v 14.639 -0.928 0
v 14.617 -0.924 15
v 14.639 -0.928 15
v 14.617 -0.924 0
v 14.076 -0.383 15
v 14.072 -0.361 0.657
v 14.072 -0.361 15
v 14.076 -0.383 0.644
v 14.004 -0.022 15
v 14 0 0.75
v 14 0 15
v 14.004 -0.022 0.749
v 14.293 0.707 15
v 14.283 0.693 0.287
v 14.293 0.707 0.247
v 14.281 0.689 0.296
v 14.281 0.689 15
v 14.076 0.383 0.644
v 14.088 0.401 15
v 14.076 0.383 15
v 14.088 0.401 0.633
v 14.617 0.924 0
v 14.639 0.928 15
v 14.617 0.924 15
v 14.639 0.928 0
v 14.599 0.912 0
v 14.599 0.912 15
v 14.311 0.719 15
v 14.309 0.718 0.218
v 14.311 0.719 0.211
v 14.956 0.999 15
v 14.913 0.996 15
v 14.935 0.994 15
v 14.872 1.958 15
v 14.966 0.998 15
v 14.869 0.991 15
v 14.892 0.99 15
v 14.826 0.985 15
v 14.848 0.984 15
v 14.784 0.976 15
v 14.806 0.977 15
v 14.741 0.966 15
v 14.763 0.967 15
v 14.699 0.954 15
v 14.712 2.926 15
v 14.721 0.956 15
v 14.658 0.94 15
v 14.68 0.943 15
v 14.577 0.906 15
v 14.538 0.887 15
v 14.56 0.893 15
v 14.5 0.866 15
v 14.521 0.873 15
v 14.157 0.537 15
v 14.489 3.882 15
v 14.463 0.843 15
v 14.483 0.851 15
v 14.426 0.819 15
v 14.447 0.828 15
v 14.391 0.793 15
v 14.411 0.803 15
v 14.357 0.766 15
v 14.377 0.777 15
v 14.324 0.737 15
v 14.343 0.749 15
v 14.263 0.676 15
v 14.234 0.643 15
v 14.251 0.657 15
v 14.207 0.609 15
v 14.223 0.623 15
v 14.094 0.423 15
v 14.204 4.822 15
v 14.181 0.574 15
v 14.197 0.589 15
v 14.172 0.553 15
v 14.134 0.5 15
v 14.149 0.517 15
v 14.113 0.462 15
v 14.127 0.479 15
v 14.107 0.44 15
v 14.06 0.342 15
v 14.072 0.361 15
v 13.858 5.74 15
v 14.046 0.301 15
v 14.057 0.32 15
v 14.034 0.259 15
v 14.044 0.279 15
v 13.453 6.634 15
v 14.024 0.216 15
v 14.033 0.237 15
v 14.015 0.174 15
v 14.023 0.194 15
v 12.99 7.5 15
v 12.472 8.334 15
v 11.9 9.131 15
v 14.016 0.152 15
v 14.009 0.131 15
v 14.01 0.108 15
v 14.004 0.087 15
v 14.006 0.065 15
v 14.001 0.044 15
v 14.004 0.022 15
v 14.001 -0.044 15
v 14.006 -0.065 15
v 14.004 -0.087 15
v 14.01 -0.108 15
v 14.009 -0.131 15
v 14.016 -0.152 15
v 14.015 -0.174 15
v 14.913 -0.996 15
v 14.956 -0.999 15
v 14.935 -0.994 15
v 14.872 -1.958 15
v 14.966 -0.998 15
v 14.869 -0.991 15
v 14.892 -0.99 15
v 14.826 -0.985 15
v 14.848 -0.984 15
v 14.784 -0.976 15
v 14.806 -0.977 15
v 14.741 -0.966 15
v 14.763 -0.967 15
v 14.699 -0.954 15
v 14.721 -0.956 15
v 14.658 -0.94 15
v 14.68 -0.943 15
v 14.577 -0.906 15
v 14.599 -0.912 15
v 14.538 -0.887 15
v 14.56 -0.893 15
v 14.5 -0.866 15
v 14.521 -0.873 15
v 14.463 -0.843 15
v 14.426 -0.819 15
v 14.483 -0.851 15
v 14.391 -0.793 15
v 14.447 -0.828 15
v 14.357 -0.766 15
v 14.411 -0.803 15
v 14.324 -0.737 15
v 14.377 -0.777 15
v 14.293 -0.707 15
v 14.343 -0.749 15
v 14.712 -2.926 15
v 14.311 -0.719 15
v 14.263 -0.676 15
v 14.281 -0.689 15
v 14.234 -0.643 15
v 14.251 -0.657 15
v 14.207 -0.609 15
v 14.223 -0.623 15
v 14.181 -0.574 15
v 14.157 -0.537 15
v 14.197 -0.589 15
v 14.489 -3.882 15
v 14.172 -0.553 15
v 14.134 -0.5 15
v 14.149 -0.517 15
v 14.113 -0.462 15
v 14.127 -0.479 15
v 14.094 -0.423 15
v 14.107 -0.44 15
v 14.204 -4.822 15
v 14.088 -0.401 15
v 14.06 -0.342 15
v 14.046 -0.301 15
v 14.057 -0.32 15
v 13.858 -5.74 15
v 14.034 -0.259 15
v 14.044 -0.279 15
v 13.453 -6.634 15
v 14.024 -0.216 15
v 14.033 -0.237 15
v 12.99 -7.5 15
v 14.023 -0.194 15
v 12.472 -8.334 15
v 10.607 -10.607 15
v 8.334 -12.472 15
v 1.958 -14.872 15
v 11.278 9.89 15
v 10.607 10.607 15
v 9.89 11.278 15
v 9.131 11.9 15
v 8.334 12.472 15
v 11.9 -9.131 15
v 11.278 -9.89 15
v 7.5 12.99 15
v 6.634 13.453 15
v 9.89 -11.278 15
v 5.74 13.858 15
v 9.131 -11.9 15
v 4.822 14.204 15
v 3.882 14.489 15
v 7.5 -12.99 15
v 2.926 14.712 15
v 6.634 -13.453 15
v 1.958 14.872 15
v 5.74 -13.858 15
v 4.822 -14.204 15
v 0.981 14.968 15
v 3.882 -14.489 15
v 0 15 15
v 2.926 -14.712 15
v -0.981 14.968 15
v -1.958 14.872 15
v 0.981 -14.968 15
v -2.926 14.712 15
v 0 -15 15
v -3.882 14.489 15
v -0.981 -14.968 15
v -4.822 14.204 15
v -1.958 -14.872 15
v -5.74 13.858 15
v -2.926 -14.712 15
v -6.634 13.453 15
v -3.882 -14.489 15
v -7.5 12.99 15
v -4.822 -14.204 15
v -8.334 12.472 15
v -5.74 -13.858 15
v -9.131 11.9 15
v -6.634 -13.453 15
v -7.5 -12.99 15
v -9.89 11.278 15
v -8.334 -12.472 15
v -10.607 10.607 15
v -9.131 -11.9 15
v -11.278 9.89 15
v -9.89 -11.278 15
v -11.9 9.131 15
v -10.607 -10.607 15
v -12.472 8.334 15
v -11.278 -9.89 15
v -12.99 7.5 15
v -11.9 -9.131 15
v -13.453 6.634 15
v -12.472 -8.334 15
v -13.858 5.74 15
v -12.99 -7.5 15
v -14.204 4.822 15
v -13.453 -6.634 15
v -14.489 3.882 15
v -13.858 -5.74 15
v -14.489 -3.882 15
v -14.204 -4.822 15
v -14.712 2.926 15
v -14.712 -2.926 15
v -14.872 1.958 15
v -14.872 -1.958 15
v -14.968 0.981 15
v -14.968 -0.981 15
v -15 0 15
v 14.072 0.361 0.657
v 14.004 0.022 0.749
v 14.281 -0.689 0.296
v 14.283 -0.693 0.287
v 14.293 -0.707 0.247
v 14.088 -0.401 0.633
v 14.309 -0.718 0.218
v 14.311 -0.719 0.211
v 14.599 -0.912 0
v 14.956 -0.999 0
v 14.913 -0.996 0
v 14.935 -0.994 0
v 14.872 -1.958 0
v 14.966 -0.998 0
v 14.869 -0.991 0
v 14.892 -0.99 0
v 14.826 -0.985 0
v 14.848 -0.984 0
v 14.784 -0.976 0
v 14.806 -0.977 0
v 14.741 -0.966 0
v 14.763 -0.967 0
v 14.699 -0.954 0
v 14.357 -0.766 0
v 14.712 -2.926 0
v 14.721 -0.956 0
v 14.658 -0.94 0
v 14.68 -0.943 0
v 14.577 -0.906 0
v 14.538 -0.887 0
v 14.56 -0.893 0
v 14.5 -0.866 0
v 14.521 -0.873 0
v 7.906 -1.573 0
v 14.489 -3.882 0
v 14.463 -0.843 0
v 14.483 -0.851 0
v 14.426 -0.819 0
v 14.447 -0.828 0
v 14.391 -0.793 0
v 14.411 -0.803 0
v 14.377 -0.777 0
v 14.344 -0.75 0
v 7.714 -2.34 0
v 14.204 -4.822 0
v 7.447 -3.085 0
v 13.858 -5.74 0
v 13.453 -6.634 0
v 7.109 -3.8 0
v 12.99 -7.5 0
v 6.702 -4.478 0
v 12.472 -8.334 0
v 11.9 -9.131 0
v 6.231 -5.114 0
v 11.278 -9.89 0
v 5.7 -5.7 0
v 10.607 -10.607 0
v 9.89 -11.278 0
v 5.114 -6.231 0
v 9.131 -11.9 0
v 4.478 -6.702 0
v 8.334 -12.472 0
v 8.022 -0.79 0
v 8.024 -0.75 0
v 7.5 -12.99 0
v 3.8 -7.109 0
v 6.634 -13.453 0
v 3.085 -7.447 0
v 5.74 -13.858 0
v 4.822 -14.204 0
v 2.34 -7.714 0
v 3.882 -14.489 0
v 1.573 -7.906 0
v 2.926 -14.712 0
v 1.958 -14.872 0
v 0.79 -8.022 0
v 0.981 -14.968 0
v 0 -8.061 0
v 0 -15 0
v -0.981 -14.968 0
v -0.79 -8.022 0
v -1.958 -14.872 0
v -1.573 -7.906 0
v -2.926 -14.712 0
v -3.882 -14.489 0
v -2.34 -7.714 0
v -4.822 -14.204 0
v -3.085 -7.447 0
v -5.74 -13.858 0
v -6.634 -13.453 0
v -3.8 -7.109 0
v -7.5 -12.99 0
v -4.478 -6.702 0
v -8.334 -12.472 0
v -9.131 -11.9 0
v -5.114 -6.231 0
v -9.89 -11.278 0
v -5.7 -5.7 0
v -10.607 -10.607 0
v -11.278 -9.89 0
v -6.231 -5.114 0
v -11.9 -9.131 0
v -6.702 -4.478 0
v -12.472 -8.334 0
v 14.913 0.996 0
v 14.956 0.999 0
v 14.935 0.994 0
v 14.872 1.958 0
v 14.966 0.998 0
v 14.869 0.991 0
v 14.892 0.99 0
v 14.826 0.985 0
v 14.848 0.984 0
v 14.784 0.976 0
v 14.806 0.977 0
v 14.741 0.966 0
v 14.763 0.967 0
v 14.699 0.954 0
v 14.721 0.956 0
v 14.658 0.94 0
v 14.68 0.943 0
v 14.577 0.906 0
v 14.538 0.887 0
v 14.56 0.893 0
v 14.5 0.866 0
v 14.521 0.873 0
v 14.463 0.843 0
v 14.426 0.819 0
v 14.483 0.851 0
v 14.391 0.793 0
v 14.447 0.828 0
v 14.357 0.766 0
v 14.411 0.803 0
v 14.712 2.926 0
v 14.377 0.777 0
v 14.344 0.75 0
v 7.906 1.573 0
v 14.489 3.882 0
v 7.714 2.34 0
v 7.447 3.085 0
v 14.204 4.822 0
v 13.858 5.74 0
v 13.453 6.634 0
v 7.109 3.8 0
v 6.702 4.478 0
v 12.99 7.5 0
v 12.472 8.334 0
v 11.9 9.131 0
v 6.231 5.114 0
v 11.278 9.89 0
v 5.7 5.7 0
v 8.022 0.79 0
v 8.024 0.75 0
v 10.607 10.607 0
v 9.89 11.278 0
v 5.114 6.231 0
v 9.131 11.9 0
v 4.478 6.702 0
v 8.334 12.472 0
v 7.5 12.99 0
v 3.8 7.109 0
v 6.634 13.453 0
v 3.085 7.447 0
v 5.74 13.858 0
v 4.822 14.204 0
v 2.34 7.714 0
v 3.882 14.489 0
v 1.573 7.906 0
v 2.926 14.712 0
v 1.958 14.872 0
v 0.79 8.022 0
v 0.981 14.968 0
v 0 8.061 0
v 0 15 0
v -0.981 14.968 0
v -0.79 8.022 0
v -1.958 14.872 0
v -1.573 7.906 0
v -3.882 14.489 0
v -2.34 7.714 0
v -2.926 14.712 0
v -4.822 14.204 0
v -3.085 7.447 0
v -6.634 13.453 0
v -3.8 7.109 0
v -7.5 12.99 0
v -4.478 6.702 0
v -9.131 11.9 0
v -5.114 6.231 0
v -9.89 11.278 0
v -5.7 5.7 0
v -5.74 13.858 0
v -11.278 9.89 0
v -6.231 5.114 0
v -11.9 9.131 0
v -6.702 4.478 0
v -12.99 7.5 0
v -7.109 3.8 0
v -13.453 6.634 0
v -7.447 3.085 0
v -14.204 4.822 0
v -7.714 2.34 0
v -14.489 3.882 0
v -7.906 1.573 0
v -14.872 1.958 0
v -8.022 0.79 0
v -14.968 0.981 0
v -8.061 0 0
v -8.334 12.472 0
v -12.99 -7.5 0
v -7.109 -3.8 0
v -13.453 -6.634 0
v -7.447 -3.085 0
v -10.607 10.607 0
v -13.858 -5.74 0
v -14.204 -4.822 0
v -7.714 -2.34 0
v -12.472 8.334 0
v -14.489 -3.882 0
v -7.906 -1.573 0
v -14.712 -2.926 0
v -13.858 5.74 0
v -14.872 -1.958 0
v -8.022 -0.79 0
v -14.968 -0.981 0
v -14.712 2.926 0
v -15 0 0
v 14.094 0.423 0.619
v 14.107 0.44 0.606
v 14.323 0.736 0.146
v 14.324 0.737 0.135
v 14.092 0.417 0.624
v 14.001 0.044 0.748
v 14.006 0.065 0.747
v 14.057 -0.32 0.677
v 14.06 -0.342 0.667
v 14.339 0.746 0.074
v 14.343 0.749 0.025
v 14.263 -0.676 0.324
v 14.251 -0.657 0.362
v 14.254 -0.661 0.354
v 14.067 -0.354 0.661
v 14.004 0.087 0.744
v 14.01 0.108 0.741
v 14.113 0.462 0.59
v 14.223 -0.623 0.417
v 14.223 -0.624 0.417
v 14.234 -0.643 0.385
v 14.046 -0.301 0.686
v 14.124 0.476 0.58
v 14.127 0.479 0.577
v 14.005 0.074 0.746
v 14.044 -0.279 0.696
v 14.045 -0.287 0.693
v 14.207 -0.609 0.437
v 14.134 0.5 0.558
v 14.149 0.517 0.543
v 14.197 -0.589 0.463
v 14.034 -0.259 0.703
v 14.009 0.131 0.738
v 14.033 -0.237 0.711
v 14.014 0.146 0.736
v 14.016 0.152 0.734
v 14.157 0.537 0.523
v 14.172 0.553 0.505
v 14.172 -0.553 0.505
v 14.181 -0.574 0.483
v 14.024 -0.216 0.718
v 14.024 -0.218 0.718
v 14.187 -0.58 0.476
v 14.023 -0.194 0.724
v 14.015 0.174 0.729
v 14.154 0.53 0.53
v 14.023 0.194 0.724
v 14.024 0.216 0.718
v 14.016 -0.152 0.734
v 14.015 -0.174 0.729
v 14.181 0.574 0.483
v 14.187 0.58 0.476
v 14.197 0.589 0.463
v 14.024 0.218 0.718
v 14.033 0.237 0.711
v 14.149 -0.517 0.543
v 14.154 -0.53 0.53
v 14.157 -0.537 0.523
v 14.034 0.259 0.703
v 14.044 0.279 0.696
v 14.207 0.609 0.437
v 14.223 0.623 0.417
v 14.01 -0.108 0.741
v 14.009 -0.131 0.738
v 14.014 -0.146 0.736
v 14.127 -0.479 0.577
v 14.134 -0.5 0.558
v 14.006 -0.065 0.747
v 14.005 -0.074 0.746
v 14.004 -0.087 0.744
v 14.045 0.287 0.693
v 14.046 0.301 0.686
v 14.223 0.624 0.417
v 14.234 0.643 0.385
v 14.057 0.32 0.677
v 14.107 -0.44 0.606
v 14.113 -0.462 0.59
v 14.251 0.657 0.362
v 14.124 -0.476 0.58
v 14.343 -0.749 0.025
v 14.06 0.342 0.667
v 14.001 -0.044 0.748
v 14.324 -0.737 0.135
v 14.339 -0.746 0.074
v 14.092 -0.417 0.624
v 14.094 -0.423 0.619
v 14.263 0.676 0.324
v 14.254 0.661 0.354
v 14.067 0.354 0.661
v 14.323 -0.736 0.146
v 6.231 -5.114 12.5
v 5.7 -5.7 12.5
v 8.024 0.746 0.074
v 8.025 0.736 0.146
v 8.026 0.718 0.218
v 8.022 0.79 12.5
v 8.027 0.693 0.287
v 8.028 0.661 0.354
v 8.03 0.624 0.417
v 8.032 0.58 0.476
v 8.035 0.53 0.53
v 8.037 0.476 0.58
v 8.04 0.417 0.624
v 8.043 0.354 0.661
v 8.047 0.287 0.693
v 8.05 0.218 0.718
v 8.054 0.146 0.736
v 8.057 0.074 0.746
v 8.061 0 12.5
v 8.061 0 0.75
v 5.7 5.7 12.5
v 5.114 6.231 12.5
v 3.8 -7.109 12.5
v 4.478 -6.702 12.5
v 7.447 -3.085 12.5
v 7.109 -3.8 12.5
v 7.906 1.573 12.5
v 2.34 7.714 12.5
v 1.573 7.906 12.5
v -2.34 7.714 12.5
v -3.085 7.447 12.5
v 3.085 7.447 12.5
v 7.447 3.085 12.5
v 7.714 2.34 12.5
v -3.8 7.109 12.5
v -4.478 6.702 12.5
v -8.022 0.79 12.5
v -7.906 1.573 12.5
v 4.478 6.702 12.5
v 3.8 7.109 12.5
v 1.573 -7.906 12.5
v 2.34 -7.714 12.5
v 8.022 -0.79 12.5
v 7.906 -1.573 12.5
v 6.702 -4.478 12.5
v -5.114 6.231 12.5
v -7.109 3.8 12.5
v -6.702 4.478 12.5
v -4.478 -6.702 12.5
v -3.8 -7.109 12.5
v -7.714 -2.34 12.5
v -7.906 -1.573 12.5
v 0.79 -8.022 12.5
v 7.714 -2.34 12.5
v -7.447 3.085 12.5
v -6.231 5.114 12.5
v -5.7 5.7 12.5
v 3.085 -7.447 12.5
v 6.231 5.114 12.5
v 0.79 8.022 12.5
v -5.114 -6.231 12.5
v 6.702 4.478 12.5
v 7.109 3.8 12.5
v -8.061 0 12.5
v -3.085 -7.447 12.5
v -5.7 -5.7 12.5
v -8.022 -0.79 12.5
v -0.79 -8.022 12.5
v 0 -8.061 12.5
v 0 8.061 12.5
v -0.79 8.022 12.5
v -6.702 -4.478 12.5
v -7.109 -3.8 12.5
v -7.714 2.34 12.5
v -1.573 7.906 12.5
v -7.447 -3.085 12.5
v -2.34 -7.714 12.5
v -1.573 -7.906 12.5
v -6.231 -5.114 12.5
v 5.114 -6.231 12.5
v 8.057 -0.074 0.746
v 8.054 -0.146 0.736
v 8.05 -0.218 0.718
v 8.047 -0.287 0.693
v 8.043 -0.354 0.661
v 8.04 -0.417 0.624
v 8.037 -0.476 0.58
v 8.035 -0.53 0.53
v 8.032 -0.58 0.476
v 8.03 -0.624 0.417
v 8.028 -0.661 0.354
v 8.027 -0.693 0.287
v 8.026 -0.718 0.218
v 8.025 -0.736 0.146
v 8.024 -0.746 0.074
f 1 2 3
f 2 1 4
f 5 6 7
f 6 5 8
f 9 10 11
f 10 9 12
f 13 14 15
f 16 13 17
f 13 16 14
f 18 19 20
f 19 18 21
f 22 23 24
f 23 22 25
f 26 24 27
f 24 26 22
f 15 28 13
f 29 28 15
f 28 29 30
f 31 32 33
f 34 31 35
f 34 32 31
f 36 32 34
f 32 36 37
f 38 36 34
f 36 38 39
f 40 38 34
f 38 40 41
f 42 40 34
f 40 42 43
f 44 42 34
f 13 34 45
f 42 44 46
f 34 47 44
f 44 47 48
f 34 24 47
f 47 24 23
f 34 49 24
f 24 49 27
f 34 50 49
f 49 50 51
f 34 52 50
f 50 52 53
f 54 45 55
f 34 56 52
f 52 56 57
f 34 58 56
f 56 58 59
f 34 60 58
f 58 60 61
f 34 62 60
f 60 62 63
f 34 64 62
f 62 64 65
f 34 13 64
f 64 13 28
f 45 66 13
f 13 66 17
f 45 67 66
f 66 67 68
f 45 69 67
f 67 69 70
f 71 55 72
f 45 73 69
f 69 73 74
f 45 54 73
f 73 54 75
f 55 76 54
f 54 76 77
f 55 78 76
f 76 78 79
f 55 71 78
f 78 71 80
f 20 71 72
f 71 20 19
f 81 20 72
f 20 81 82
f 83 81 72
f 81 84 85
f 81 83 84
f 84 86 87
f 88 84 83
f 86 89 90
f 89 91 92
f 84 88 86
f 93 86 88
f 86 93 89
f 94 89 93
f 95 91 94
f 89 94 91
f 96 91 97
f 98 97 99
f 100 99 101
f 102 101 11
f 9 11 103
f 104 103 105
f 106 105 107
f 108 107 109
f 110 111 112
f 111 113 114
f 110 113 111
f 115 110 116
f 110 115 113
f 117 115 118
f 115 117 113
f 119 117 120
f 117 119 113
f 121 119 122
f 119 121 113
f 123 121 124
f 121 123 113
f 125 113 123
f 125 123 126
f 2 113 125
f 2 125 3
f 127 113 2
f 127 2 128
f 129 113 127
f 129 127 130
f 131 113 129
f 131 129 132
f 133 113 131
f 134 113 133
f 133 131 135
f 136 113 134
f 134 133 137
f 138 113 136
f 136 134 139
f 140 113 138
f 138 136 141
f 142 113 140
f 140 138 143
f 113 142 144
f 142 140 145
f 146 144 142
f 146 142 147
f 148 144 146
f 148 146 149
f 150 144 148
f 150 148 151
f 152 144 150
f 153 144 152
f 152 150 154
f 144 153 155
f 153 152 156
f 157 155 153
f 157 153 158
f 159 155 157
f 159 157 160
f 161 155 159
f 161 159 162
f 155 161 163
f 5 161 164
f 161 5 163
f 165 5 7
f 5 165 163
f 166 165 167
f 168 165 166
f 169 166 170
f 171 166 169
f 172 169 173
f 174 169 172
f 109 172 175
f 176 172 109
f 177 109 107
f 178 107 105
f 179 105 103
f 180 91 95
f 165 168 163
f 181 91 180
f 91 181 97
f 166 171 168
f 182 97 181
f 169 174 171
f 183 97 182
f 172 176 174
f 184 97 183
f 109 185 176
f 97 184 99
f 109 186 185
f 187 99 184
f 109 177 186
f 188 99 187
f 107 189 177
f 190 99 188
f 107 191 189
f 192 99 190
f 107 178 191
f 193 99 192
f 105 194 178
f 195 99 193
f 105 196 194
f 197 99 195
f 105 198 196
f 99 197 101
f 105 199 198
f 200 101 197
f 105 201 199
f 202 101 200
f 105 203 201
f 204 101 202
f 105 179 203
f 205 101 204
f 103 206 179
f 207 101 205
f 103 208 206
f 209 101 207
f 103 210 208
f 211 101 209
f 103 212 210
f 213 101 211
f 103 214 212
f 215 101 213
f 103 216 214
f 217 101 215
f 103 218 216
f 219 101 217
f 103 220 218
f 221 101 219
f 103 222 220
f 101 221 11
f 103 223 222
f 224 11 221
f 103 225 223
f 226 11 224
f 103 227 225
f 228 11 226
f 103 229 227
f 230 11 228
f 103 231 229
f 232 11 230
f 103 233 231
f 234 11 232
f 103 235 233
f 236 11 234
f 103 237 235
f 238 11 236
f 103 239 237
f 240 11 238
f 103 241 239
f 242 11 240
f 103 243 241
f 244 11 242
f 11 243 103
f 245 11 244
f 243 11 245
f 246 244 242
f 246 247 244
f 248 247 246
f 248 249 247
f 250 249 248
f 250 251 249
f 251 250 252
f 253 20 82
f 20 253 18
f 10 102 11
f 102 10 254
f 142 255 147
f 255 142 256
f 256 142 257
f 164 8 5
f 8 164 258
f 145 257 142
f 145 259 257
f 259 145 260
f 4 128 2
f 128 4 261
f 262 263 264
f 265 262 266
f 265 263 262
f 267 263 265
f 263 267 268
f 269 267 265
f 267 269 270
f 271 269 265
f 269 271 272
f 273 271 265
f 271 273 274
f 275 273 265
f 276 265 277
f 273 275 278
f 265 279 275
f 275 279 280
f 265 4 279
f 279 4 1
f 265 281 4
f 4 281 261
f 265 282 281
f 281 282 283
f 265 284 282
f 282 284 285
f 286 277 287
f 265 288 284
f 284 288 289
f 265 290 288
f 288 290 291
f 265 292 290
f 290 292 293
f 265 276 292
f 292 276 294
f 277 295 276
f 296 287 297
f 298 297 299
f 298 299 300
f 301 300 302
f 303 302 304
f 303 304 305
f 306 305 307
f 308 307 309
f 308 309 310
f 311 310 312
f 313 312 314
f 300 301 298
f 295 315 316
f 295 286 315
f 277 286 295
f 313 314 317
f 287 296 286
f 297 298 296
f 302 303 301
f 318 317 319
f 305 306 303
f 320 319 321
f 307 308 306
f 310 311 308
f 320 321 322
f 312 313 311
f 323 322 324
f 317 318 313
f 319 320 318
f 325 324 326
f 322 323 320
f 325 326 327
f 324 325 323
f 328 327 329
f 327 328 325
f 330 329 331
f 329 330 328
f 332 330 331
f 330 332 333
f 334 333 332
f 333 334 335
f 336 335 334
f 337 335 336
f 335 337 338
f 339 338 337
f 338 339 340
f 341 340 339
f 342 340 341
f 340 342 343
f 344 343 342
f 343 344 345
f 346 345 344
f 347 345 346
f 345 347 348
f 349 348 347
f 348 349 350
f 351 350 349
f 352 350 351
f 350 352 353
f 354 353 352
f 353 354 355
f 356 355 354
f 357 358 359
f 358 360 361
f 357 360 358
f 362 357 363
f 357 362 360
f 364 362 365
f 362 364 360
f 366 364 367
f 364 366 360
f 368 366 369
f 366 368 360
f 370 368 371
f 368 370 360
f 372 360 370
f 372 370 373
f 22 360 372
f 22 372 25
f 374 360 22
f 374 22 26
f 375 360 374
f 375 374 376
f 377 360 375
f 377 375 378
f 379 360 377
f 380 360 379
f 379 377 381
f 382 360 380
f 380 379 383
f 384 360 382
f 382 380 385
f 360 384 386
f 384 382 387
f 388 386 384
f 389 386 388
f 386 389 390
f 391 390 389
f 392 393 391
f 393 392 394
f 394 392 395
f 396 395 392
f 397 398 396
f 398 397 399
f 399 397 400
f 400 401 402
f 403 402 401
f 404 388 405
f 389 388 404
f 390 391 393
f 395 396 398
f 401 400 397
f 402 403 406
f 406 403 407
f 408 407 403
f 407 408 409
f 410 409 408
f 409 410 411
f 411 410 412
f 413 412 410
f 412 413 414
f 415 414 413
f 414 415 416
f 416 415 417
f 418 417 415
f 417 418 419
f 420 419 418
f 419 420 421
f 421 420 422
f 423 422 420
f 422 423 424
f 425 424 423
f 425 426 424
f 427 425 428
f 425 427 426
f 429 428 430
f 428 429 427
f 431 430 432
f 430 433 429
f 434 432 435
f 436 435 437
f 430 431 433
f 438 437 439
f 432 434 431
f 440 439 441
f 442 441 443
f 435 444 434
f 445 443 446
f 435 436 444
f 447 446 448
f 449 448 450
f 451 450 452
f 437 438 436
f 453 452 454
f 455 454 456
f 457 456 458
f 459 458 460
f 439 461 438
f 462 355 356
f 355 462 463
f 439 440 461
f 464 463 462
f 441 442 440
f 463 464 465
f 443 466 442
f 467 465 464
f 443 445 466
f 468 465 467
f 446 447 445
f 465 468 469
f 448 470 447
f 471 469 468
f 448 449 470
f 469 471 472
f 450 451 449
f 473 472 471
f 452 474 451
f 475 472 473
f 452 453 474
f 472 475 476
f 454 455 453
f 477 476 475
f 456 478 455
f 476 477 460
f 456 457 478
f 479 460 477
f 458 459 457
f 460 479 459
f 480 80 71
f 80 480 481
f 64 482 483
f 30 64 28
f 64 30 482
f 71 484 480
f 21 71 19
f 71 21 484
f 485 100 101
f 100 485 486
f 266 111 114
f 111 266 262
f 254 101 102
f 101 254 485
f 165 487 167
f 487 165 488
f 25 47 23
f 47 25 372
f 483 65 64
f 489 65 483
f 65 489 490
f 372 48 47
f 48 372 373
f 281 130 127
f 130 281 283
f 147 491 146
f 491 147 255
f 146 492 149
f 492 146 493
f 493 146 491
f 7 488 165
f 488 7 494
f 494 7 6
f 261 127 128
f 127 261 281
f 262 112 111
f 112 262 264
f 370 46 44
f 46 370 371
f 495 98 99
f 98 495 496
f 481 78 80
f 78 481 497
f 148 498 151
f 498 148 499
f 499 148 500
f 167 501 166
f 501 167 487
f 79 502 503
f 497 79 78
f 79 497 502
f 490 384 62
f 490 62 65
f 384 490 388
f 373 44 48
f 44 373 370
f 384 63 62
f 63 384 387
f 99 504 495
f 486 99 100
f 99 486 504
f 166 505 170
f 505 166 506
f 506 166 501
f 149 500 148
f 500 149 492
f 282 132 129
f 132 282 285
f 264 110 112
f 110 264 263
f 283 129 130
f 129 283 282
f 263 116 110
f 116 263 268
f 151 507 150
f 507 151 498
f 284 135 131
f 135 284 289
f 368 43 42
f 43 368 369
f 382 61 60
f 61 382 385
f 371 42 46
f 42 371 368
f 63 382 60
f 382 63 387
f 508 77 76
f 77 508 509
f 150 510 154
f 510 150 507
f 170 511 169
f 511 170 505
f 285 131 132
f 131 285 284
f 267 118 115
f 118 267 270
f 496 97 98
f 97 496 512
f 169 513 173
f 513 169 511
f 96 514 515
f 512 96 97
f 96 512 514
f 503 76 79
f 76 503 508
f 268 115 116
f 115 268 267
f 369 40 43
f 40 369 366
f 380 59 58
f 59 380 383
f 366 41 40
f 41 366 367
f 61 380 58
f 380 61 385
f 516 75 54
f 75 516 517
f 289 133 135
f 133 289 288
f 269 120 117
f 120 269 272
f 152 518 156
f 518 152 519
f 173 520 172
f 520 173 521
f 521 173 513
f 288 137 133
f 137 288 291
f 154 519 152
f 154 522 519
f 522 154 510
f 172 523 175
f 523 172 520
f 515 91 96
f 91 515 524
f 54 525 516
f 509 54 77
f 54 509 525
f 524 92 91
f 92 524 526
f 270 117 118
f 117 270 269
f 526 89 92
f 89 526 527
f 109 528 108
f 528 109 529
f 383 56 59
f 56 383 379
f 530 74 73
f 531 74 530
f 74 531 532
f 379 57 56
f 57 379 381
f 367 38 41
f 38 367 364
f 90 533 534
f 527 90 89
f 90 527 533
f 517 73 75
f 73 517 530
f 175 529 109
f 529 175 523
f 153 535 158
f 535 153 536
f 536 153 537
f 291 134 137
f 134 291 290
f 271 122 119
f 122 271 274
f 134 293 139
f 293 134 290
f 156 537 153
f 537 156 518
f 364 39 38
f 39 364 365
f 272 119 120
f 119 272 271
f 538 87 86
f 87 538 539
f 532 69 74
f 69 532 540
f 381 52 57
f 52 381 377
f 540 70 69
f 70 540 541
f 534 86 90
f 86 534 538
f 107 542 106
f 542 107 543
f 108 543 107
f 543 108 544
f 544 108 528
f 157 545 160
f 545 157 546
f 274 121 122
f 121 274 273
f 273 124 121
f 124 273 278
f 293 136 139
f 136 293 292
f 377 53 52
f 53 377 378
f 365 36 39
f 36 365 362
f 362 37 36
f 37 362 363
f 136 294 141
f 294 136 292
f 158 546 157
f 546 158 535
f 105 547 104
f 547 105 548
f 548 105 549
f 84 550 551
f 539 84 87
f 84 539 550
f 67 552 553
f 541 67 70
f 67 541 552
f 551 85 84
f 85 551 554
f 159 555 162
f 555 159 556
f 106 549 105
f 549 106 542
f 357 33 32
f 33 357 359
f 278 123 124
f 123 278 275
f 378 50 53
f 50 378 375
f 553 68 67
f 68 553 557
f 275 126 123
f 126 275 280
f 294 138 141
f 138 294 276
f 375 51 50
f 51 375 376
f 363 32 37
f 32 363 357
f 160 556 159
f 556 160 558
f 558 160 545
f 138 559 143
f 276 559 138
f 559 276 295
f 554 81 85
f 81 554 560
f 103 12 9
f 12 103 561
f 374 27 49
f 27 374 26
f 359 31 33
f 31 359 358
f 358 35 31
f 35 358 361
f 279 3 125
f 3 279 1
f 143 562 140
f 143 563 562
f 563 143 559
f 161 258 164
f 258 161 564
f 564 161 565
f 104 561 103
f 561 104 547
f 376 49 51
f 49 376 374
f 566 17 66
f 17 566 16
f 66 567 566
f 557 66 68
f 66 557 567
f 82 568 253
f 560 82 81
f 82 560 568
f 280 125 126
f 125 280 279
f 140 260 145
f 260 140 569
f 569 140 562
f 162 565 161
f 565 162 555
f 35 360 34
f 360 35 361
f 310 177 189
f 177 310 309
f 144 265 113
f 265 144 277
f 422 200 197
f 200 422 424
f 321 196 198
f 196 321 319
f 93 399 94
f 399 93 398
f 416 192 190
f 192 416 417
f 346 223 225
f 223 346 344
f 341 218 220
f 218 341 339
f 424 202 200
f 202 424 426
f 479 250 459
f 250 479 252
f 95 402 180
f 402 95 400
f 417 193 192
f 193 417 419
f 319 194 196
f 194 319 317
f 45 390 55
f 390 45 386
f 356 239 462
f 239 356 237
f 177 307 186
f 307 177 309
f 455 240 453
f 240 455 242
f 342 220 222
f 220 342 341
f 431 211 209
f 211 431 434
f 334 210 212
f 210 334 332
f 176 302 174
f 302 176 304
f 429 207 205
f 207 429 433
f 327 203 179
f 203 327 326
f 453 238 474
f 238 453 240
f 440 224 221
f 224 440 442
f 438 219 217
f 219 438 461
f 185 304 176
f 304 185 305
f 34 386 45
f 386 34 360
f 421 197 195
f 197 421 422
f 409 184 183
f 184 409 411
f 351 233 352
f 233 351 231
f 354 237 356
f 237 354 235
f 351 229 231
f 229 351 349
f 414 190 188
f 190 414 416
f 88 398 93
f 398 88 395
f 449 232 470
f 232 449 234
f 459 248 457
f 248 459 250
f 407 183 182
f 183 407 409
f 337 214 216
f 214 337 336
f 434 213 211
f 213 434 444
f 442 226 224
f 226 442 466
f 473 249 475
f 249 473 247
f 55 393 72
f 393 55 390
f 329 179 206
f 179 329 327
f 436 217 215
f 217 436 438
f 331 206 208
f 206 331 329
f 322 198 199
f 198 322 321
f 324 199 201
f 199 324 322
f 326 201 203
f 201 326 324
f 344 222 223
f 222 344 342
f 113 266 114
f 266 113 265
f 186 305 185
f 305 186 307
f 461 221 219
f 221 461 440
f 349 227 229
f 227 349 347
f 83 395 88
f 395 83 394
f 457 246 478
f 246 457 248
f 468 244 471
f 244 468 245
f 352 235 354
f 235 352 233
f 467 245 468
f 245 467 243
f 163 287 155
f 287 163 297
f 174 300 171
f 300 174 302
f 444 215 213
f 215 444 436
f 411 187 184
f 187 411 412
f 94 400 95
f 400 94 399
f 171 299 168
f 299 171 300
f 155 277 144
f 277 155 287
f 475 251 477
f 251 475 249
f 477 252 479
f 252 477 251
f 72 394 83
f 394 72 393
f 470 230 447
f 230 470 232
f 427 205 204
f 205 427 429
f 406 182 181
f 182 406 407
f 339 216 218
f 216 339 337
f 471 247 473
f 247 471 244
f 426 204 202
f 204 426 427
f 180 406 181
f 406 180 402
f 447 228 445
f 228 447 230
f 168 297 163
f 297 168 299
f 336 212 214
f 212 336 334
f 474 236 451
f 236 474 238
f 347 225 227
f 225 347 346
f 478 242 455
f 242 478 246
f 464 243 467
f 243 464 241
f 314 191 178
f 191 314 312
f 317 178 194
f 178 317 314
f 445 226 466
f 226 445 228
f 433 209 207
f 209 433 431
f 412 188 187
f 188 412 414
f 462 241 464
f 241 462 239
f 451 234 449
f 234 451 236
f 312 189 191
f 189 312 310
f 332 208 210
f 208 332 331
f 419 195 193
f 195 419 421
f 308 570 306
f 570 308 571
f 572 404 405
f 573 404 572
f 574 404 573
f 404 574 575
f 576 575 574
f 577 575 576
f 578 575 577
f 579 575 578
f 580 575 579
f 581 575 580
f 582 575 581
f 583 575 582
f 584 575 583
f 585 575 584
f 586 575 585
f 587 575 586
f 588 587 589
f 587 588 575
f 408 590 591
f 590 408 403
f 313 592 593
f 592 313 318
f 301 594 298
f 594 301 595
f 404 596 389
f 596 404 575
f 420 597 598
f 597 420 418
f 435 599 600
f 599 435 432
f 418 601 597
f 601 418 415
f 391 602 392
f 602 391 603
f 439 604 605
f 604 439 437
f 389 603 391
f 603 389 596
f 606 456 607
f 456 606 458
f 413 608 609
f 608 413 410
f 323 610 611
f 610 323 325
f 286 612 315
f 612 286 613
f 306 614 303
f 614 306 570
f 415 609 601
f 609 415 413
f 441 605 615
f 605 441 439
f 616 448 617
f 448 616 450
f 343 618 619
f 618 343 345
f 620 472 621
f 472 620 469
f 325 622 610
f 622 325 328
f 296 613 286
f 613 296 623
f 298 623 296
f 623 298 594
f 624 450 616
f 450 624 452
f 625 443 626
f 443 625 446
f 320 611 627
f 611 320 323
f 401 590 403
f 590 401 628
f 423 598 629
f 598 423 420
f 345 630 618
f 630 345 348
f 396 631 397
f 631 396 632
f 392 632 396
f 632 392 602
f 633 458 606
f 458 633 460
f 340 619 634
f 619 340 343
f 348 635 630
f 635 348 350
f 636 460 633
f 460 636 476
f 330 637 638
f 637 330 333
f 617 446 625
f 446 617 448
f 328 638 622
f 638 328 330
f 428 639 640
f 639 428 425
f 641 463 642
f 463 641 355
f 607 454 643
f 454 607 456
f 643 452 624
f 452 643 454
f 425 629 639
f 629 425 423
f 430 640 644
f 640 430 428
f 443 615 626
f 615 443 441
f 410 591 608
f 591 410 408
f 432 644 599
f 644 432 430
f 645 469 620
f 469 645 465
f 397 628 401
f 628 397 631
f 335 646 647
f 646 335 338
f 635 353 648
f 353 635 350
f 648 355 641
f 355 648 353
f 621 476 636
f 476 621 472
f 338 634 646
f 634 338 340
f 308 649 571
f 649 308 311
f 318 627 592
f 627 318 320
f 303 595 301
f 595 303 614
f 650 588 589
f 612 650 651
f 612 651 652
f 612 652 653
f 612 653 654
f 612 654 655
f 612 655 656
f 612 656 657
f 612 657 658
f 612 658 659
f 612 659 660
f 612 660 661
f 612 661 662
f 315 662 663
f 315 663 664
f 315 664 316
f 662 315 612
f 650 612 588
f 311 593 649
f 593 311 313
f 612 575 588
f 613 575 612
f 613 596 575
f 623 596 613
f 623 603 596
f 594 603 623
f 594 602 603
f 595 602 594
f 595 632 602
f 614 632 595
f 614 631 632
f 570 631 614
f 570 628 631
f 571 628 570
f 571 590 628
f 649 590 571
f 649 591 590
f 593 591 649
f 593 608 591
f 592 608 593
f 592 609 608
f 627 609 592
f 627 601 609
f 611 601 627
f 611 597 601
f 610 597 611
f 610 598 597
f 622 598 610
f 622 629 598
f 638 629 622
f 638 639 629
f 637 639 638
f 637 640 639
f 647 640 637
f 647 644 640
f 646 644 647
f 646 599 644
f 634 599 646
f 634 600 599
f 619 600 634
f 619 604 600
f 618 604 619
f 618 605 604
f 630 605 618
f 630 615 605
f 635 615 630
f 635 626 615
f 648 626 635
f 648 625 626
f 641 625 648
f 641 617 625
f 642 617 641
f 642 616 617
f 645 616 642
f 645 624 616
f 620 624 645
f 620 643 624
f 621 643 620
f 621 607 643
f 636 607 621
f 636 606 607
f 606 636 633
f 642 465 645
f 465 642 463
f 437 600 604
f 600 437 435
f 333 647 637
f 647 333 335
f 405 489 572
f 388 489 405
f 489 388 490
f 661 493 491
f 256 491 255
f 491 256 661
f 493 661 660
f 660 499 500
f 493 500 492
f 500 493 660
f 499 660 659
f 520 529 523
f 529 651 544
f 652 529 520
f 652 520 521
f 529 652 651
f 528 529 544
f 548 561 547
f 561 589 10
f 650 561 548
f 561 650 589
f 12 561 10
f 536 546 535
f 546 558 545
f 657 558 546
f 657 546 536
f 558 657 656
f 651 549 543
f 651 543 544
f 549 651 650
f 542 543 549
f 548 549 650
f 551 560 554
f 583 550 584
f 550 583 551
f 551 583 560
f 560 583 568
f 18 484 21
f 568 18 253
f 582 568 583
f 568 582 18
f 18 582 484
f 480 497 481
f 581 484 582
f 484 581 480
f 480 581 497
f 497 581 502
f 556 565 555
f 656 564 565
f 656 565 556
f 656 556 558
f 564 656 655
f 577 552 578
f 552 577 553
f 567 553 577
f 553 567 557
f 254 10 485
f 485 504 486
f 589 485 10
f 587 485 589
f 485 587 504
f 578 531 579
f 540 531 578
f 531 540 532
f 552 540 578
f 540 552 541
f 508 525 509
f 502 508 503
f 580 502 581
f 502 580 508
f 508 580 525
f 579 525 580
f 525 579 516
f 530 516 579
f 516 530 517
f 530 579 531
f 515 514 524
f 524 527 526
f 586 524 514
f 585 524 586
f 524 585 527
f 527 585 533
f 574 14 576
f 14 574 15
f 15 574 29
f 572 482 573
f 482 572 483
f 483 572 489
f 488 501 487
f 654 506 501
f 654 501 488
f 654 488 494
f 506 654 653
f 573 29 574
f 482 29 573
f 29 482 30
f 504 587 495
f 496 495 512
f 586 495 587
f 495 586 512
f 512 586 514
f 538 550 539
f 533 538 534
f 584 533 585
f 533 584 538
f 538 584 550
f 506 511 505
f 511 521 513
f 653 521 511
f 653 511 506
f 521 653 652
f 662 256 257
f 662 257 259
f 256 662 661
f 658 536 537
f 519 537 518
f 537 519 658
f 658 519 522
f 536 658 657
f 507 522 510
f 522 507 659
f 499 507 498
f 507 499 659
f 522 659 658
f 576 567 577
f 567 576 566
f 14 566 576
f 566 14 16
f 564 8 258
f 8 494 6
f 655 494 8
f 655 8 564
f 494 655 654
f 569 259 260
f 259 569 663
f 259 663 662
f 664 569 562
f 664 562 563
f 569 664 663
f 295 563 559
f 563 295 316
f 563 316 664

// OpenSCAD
// Replacement knob for hotplate stirrer with D-shaft
// Print orientation: D-flat side facing hotplate down on bed (z = 0)

// ---------------- Parameters ----------------
knob_d        = 30;    // knob outer diameter
knob_h        = 15;    // knob height
shaft_d       = 6.2;   // D-shaft diameter
bore_depth    = 12;    // blind bore depth from bottom face
bore_flat     = 4.7;   // D-bore flat-to-flat distance (across circle)
groove_count  = 18;    // number of grip grooves
groove_d      = 2;     // grip groove diameter (half-cylinder)
pointer_w     = 1.5;   // pointer groove width
pointer_d    = pointer_w; // pointer groove depth (same as width)
eps           = 0.5;   // cutter overshoot past faces

// Derived
r = knob_d / 2;
$fn = 96;

// ---------------- Model ----------------
difference() {
    // Main cylinder
    cylinder(d = knob_d, h = knob_h);

    // D-shaped blind bore, centred on origin, flat on +x side
    translate([0, 0, -eps])
        cylinder(d = bore_d(bore_flat), h = bore_depth + 2 * eps, $fn = 64);

    // Grip grooves: vertical half-cylinders centred on outer surface
    for (i = [0 : groove_count - 1]) {
        a = i * 360 / groove_count;
        translate([r, 0, 0])
            rotate([0, 0, a])
                cylinder(d = groove_d, h = knob_h, $fn = 16);
    }

    // Pointer groove: runs from centre to outer edge on +x side
    translate([-(pointer_d / 2), 0, 0])
        rotate([0, 90, 0])
            linear_extrude(knob_d)
                circle(d = pointer_d, $fn = 64);
}

// Helper: D-bore diameter from flat-to-flat distance
function bore_d(flat) = sqrt(flat * (4 * r - flat));
